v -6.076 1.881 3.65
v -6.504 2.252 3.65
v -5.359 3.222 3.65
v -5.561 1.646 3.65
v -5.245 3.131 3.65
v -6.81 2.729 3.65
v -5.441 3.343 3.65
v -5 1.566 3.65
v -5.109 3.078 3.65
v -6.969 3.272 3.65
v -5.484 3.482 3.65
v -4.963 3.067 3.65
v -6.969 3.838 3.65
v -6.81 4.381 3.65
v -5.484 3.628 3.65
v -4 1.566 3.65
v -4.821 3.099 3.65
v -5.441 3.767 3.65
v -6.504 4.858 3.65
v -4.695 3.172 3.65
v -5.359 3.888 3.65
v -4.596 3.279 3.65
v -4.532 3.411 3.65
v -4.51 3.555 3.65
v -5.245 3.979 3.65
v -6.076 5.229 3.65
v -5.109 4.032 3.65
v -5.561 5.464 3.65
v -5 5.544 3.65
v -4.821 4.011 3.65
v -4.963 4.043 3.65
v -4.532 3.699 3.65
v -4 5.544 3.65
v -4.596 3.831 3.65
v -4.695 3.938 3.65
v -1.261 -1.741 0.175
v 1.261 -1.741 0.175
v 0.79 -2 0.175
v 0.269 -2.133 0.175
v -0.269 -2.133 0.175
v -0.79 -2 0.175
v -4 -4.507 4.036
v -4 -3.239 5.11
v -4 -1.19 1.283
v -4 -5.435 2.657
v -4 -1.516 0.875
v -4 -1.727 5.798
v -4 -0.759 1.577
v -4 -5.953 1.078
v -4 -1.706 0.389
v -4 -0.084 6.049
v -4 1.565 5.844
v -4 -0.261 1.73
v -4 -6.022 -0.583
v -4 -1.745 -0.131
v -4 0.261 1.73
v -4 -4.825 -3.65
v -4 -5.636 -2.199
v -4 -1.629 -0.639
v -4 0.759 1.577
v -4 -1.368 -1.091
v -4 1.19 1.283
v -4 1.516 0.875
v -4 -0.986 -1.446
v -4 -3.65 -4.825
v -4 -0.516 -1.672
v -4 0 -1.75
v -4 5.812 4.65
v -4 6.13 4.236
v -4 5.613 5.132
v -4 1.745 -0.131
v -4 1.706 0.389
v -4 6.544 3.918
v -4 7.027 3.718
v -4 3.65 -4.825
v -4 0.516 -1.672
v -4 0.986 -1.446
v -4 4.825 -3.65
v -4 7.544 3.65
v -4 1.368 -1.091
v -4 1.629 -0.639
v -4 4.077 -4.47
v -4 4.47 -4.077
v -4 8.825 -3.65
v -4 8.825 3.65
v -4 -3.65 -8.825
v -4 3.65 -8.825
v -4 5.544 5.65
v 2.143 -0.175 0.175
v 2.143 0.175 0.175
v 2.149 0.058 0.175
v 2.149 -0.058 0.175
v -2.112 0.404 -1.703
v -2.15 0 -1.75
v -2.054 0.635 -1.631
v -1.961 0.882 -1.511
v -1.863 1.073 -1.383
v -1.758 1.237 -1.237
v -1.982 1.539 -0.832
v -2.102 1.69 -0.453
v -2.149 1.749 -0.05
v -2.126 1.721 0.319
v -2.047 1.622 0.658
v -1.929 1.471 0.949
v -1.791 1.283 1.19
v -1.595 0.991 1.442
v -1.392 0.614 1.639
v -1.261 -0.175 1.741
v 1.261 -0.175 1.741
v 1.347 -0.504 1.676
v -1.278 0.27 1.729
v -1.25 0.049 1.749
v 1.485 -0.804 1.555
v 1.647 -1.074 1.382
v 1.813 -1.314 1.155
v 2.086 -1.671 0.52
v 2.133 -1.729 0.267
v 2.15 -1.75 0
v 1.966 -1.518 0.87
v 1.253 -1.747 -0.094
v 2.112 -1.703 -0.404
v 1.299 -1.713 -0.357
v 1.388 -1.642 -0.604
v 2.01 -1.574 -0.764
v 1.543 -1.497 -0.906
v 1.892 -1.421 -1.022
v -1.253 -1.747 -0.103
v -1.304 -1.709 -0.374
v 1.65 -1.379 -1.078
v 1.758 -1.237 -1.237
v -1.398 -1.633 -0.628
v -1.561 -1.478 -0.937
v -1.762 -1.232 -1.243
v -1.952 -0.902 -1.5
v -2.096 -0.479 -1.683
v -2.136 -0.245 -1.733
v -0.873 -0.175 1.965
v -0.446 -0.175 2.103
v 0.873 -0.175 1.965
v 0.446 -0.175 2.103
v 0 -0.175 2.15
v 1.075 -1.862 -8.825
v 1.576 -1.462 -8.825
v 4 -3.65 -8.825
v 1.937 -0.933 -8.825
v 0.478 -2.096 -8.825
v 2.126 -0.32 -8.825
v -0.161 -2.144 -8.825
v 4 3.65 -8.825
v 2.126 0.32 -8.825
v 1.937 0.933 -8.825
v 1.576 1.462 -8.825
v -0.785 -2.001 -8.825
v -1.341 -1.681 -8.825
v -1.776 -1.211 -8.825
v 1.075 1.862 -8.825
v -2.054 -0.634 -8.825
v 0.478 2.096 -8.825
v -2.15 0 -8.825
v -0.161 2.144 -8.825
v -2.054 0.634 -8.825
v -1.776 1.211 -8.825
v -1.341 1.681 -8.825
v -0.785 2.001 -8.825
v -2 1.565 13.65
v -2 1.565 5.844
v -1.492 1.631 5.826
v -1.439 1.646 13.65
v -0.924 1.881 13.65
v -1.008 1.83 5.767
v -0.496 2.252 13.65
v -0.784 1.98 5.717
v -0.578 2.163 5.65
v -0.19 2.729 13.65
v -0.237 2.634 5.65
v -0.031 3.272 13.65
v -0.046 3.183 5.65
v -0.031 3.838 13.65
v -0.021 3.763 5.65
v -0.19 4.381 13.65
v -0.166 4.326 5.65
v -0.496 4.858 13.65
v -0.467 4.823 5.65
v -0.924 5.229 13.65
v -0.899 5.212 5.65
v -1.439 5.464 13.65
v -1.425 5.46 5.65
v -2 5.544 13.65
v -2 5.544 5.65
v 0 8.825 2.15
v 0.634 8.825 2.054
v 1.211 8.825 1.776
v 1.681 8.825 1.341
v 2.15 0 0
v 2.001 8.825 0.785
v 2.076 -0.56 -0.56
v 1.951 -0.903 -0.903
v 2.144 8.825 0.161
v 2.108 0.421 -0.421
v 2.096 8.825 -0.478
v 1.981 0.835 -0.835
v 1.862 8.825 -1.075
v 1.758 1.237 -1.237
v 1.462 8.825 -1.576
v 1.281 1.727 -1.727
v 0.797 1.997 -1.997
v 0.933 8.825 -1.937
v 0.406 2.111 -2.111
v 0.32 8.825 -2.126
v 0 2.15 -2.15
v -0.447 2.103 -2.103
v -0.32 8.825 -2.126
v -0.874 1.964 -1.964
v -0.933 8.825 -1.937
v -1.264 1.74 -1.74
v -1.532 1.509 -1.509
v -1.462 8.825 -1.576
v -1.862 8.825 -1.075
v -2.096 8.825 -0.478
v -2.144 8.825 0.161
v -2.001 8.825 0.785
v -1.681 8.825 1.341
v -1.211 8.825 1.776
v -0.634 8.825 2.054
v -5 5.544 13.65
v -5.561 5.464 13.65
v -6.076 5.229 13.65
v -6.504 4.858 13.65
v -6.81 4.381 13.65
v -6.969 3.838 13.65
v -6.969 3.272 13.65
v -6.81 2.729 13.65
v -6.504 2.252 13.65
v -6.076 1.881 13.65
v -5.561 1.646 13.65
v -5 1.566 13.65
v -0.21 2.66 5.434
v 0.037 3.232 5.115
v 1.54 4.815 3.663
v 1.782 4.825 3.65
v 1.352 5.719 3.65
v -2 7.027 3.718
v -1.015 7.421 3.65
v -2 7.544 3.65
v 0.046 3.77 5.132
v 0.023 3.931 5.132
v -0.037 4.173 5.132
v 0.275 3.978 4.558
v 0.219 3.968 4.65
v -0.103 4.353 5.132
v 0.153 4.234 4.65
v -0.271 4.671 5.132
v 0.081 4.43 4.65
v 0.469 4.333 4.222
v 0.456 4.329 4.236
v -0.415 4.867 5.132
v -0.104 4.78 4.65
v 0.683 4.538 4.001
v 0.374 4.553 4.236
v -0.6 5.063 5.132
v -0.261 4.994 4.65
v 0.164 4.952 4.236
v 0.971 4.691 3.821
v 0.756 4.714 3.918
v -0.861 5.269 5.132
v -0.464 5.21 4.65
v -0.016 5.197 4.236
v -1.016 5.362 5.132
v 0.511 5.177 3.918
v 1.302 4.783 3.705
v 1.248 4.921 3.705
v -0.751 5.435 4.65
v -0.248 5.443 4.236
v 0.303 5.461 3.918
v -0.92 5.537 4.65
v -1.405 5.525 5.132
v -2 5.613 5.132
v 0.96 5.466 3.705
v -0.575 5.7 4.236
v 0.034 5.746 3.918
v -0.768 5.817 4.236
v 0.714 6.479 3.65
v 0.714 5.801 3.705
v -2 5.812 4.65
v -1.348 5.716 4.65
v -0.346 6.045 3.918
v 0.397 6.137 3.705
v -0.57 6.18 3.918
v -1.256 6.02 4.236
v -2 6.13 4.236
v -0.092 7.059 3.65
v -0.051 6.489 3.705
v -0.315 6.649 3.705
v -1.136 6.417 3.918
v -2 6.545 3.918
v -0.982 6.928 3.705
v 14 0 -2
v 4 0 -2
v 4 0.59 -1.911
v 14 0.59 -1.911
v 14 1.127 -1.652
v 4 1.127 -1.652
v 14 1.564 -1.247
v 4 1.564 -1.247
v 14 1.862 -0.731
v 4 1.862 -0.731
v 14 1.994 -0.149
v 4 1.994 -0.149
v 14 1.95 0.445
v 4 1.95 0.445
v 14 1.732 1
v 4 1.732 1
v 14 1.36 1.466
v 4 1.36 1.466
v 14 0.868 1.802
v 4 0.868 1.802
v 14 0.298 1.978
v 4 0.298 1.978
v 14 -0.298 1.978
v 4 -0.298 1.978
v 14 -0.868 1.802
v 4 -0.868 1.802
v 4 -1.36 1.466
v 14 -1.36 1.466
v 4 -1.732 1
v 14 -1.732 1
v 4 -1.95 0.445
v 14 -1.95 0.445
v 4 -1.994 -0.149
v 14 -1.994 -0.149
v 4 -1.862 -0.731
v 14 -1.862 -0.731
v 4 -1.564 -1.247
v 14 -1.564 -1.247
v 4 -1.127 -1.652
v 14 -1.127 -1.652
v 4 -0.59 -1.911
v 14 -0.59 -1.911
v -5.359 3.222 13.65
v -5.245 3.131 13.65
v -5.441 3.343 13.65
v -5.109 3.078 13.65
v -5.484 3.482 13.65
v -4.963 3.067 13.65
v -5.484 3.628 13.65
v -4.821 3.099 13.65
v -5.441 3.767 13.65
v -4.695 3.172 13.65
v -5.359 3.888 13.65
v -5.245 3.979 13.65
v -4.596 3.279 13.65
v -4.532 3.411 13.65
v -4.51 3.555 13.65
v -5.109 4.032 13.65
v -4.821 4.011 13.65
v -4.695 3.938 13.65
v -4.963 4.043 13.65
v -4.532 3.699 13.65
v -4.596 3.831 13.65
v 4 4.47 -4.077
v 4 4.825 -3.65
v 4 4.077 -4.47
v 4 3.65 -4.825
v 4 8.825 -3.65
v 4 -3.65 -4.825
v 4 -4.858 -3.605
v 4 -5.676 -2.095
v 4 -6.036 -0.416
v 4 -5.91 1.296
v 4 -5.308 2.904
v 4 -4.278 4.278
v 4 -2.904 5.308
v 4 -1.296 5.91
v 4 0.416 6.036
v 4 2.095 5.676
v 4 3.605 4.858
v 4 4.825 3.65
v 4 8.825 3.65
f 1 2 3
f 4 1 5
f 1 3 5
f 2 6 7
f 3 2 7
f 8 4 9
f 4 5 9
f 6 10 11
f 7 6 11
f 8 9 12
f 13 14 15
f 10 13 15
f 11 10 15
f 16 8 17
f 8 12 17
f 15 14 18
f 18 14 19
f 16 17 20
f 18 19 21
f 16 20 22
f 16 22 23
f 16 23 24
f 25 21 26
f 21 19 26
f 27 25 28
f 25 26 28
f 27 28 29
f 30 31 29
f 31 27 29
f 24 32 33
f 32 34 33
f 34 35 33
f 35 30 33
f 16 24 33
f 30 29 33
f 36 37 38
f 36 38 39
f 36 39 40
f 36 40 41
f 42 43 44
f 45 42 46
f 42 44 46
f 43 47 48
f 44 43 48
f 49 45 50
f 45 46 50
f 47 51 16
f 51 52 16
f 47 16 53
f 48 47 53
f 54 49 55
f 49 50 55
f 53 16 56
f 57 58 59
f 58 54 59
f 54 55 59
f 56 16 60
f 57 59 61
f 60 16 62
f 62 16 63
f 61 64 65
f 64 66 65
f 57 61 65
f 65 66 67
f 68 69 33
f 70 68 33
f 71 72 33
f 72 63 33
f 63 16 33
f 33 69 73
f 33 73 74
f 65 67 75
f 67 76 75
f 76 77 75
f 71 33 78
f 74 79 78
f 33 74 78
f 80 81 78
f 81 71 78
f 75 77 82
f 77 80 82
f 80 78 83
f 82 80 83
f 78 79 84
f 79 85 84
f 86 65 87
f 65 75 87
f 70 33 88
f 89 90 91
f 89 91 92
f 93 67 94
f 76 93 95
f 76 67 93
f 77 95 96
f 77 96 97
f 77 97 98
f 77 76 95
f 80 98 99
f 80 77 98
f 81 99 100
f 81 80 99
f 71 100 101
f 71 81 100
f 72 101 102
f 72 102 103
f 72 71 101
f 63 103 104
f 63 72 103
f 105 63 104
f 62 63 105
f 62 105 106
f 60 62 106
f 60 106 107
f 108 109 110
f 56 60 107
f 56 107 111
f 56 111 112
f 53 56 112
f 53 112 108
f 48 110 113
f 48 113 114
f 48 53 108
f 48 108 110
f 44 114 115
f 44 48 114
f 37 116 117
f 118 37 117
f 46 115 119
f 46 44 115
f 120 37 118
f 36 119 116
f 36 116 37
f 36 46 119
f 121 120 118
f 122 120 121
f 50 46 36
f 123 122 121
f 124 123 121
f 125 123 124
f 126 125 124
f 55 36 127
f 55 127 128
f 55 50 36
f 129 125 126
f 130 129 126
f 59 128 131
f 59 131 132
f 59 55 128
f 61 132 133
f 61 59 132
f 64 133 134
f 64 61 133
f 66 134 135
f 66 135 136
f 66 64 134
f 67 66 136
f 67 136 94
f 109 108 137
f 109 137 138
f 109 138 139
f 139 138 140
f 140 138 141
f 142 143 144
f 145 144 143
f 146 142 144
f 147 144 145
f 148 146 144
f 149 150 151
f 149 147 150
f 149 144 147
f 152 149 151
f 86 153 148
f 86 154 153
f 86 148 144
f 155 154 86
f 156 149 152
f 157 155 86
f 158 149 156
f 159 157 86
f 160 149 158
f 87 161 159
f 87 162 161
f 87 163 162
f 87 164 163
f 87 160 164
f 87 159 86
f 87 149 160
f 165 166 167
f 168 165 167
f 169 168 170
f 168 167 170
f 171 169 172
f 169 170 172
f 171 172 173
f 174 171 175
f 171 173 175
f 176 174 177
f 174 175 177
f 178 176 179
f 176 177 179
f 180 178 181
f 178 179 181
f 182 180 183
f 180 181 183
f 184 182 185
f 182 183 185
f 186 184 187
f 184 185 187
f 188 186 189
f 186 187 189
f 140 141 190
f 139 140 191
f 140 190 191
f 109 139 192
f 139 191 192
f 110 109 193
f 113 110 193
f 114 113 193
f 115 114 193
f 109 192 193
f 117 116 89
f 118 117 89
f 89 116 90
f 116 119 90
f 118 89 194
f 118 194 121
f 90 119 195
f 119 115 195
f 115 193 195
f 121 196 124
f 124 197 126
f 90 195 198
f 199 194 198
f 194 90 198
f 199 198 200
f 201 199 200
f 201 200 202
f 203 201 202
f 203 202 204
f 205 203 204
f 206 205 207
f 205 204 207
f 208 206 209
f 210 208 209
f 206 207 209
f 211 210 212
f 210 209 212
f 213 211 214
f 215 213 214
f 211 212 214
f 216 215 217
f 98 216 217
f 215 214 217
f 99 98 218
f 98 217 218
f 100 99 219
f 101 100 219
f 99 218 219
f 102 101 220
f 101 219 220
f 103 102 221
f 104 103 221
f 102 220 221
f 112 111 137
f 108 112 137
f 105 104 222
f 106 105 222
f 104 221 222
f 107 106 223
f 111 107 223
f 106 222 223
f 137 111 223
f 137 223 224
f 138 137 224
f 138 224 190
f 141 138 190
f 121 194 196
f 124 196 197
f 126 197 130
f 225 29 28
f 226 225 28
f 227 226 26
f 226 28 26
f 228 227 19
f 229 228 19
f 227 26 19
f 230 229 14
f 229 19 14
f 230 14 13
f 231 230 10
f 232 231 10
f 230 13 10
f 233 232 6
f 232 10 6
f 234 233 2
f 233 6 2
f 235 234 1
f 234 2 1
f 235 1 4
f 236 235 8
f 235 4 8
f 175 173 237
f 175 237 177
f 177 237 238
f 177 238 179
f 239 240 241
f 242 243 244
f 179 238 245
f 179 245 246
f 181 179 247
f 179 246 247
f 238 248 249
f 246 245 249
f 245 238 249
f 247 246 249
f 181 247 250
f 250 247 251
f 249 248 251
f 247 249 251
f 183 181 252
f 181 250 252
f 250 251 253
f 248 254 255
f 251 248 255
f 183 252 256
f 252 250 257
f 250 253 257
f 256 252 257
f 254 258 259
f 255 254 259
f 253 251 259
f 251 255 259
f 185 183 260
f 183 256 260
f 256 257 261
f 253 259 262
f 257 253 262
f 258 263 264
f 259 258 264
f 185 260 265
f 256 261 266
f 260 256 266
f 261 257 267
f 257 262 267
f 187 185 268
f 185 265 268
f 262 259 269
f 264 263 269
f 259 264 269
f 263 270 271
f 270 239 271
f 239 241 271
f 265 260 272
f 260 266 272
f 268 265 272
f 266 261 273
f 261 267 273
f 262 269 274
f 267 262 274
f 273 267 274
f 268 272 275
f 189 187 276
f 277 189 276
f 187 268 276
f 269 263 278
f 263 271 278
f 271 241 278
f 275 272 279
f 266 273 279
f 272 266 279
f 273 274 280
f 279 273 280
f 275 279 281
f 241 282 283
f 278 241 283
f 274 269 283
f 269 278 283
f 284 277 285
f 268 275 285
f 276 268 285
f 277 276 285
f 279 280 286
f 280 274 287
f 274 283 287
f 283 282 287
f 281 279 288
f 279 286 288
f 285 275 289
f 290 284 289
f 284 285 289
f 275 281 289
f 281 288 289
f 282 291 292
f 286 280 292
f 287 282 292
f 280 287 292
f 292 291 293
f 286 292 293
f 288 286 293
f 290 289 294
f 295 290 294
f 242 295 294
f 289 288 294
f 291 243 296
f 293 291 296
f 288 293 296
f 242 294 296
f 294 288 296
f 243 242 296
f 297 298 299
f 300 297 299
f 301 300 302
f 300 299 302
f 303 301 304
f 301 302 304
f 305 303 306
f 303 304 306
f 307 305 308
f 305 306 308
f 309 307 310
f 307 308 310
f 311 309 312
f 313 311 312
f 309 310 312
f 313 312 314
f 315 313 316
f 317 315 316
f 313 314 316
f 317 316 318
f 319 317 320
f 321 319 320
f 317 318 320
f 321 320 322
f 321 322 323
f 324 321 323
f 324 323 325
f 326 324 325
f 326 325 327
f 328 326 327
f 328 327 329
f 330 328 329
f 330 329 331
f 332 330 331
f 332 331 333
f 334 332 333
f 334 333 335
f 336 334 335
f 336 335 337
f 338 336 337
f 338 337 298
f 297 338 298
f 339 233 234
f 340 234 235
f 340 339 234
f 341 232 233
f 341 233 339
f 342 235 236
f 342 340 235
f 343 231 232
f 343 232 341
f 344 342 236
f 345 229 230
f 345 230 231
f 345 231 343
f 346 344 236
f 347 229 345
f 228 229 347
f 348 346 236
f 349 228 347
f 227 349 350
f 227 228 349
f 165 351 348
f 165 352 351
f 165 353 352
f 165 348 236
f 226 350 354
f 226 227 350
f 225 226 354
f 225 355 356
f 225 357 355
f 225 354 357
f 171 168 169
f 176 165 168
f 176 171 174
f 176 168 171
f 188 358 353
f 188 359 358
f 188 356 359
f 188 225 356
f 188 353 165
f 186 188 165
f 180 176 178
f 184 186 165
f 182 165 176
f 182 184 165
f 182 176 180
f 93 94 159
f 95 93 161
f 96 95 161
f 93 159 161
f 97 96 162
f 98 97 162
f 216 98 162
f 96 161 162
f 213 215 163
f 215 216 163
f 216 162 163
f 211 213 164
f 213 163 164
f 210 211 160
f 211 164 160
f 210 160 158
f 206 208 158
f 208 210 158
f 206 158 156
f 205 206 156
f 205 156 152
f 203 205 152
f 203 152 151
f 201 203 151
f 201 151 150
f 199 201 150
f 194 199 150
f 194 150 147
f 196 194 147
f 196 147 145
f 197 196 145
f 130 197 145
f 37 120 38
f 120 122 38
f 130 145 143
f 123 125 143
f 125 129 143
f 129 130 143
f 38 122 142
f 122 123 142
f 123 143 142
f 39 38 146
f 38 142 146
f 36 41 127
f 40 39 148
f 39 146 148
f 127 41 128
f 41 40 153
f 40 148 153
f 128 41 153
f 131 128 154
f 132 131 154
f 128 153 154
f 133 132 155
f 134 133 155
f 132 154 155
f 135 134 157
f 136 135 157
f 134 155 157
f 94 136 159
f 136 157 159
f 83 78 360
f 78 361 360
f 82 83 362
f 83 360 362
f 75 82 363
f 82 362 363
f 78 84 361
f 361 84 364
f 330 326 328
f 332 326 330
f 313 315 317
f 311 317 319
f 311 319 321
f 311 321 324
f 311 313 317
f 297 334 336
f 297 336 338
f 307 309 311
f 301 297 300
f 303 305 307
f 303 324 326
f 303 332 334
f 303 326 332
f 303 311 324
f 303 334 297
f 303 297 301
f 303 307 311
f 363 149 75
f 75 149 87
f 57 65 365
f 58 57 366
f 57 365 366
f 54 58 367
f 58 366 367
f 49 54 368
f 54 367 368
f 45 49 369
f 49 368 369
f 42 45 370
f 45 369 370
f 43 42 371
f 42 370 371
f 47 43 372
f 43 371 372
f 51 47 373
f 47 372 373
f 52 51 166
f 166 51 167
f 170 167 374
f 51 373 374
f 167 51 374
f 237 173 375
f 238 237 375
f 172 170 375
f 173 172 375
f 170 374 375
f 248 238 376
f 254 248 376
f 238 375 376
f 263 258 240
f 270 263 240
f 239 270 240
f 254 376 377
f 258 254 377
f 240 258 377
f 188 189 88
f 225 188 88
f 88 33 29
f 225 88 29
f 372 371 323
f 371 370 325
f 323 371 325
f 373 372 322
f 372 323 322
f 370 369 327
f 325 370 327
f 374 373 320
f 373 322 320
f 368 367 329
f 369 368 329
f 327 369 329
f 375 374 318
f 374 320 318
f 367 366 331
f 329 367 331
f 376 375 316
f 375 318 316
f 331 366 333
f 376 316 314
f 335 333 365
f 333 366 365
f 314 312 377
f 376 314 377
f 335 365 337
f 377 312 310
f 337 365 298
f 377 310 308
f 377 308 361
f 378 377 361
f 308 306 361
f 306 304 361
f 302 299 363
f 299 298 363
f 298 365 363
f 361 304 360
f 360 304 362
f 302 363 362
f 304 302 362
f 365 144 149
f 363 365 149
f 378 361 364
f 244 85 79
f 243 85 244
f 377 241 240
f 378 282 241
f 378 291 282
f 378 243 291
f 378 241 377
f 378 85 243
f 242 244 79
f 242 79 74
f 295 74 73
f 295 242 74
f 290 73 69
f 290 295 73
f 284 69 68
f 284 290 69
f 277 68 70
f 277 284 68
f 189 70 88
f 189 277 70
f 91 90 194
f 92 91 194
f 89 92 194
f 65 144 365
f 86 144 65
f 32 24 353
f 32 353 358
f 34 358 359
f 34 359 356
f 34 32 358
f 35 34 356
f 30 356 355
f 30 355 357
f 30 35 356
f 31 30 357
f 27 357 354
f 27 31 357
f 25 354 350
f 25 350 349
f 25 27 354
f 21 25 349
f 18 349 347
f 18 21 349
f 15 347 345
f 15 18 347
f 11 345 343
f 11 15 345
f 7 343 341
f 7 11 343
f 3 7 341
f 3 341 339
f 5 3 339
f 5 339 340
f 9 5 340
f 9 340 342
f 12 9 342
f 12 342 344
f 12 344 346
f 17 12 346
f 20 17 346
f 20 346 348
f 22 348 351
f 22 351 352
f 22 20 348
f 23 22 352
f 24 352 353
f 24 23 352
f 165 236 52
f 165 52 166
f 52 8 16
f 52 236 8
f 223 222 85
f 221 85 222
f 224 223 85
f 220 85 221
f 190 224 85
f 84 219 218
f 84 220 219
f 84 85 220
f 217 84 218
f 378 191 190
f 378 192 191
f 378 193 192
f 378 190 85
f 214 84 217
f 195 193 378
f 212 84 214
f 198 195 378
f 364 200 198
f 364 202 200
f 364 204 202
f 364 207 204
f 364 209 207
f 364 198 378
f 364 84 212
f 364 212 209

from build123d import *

# Parameters (mm, degrees)
SKETCH1_R               = 1.75
BOSS_EXTRUDE1_DEPTH     = 4
SKETCH2_R               = 2.15
CUT_EXTRUDE1_DEPTH      = 5
BOSS_EXTRUDE5_START     = -1.8499999
BOSS_EXTRUDE5_OUTLINE_R = 2
BOSS_EXTRUDE5_DEPTH     = 11.8499999
BOSS_EXTRUDE5_START_2   = -3
BOSS_EXTRUDE5_2_DEPTH   = 7.824935333
SKETCH3_R               = 2.15
CUT_EXTRUDE2_DEPTH      = 5
BOSS_EXTRUDE2_START     = 4
SKETCH4_W               = 8
SKETCH4_H               = 7.3
SKETCH4_R               = 2.15
BOSS_EXTRUDE2_DEPTH     = 4
BOSS_EXTRUDE3_START     = 4
SKETCH5_W               = 8
SKETCH5_H               = 7.3
SKETCH5_R               = 2.15
BOSS_EXTRUDE3_DEPTH     = 4
SKETCH6_R               = 0.4895
BOSS_EXTRUDE4_DEPTH     = 10
FILLET1_R               = 2


with BuildPart() as part:
    # Sketch1 → Boss-Extrude1 (new, symmetric)
    with BuildSketch(Plane(origin=(0, 0, 0), x_dir=(0, 0, -1), z_dir=(1, 0, 0))):
        with BuildLine():
            Line((-3.65, 4.824935233), (3.65, 4.824935233))
            ThreePointArc((3.65, 4.824935233), (4.277996026, 4.277996026), (4.824935233, 3.65))
            Line((4.824935233, 3.65), (4.824935233, -3.65))
            ThreePointArc((4.824935233, -3.65), (-4.277996026, -4.277996026), (-3.65, 4.824935233))
        make_face()
        Circle(SKETCH1_R, mode=Mode.SUBTRACT)
    extrude(amount=BOSS_EXTRUDE1_DEPTH, both=True)

    # Sketch2 → Cut-Extrude1 (cut)
    with BuildSketch(Plane(origin=(0, 4.824935233, 0), x_dir=(1, 0, 0), z_dir=(0, 1, 0))):
        with Locations(Location((0, 0, 0), (0, 0, 270))):
            Circle(SKETCH2_R)
    extrude(amount=-CUT_EXTRUDE1_DEPTH, mode=Mode.SUBTRACT)

    # Boss-Extrude5: read off the stored shape, not the designer's step
    # Boss-Extrude5 outline → Boss-Extrude5 (add)
    with BuildSketch(Plane(origin=(4, 0, 0), x_dir=(0, 0, -1), z_dir=(1, 0, 0)).offset(BOSS_EXTRUDE5_START)):
        Circle(BOSS_EXTRUDE5_OUTLINE_R)
    extrude(amount=BOSS_EXTRUDE5_DEPTH)

    # Boss-Extrude5 2 outline → Boss-Extrude5 2 (add)
    with BuildSketch(Plane(origin=(0, 0, 0), x_dir=(1, 0, 0), z_dir=(0, 1, 0)).offset(BOSS_EXTRUDE5_START_2)):
        with BuildLine():
            Line((2.1500001, -3), (2.15, 0))
            ThreePointArc((2.15, 0), (1.52027958, -1.52027958), (0, -2.15))
            Line((0, -2.15), (0, -3))
            Line((0, -3), (2.1500001, -3))
        make_face()
        with BuildLine():
            ThreePointArc((0, 2.15), (1.52027958, 1.52027958), (2.15, 0))
            Line((2.15, 0), (2.1500001, 3))
            Line((2.1500001, 3), (0, 3))
            Line((0, 3), (0, 2.15))
        make_face()
    extrude(amount=BOSS_EXTRUDE5_2_DEPTH)

    # Sketch3 → Cut-Extrude2 (cut)
    with BuildSketch(Plane(origin=(0, 0, -4.824935233), x_dir=(-1, 0, 0), z_dir=(0, 0, -1))):
        Circle(SKETCH3_R)
    extrude(amount=-CUT_EXTRUDE2_DEPTH, mode=Mode.SUBTRACT)

    # Sketch4 → Boss-Extrude2 (add)
    with BuildSketch(Plane(origin=(0, 4.824935233, 0), x_dir=(1, 0, 0), z_dir=(0, 1, 0)).offset(BOSS_EXTRUDE2_START)):
        Rectangle(SKETCH4_W, SKETCH4_H)
        with Locations(Location((0, 0, 0), (0, 0, 270))):
            Circle(SKETCH4_R, mode=Mode.SUBTRACT)
    extrude(amount=-BOSS_EXTRUDE2_DEPTH)

    # Sketch5 → Boss-Extrude3 (add)
    with BuildSketch(Plane(origin=(0, 0, -4.824935233), x_dir=(-1, 0, 0), z_dir=(0, 0, -1)).offset(BOSS_EXTRUDE3_START)):
        Rectangle(SKETCH5_W, SKETCH5_H)
        Circle(SKETCH5_R, mode=Mode.SUBTRACT)
    extrude(amount=-BOSS_EXTRUDE3_DEPTH)

    # Sketch6 → Boss-Extrude4 (add)
    with BuildSketch(Plane.XY.offset(3.65)):
        with BuildLine():
            Line((-2, 5.5445), (-5, 5.5445))
            ThreePointArc((-5, 5.5445), (-6.9895, 3.555), (-5, 1.5655))
            Line((-5, 1.5655), (-2, 1.5655))
            ThreePointArc((-2, 1.5655), (-0.0105, 3.555), (-2, 5.5445))
        make_face()
        with Locations((-5, 3.555)):
            Circle(SKETCH6_R, mode=Mode.SUBTRACT)
    extrude(amount=BOSS_EXTRUDE4_DEPTH)

    # Fillet1
    # the kernel refuses this fillet: 2 mm, written as the material it adds along each edge
    with BuildSketch(Plane(origin=(-2, 3.555, 3.65), x_dir=(-0.2477928617675286, -0.9688130354495952, 0), z_dir=(-0.9688130354495952, 0.2477928617675286, 0))) as fillet1_piece_1:
        with BuildLine():
            CenterArc((1.9895 + FILLET1_R, FILLET1_R), FILLET1_R, 180, 90)
            Line((1.9895 + FILLET1_R, 0), (1.9895, 0))
            Line((1.9895, 0), (1.9895, FILLET1_R))
        make_face()
    revolve(axis=Axis((-2, 3.555, 3.65), (0, 0, 1)), revolution_arc=194.346943464)
    with BuildSketch(Plane(origin=(-2, 5.5445, 3.65), x_dir=(0, 0, 1), z_dir=(-1, 0, 0))) as fillet1_piece_2:
        with BuildLine():
            CenterArc((FILLET1_R, FILLET1_R), FILLET1_R, 180, 90)
            Line((0, FILLET1_R), (0, 0))
            Line((0, 0), (FILLET1_R, 0))
        make_face()
    extrude(amount=2)


solid = part.part
